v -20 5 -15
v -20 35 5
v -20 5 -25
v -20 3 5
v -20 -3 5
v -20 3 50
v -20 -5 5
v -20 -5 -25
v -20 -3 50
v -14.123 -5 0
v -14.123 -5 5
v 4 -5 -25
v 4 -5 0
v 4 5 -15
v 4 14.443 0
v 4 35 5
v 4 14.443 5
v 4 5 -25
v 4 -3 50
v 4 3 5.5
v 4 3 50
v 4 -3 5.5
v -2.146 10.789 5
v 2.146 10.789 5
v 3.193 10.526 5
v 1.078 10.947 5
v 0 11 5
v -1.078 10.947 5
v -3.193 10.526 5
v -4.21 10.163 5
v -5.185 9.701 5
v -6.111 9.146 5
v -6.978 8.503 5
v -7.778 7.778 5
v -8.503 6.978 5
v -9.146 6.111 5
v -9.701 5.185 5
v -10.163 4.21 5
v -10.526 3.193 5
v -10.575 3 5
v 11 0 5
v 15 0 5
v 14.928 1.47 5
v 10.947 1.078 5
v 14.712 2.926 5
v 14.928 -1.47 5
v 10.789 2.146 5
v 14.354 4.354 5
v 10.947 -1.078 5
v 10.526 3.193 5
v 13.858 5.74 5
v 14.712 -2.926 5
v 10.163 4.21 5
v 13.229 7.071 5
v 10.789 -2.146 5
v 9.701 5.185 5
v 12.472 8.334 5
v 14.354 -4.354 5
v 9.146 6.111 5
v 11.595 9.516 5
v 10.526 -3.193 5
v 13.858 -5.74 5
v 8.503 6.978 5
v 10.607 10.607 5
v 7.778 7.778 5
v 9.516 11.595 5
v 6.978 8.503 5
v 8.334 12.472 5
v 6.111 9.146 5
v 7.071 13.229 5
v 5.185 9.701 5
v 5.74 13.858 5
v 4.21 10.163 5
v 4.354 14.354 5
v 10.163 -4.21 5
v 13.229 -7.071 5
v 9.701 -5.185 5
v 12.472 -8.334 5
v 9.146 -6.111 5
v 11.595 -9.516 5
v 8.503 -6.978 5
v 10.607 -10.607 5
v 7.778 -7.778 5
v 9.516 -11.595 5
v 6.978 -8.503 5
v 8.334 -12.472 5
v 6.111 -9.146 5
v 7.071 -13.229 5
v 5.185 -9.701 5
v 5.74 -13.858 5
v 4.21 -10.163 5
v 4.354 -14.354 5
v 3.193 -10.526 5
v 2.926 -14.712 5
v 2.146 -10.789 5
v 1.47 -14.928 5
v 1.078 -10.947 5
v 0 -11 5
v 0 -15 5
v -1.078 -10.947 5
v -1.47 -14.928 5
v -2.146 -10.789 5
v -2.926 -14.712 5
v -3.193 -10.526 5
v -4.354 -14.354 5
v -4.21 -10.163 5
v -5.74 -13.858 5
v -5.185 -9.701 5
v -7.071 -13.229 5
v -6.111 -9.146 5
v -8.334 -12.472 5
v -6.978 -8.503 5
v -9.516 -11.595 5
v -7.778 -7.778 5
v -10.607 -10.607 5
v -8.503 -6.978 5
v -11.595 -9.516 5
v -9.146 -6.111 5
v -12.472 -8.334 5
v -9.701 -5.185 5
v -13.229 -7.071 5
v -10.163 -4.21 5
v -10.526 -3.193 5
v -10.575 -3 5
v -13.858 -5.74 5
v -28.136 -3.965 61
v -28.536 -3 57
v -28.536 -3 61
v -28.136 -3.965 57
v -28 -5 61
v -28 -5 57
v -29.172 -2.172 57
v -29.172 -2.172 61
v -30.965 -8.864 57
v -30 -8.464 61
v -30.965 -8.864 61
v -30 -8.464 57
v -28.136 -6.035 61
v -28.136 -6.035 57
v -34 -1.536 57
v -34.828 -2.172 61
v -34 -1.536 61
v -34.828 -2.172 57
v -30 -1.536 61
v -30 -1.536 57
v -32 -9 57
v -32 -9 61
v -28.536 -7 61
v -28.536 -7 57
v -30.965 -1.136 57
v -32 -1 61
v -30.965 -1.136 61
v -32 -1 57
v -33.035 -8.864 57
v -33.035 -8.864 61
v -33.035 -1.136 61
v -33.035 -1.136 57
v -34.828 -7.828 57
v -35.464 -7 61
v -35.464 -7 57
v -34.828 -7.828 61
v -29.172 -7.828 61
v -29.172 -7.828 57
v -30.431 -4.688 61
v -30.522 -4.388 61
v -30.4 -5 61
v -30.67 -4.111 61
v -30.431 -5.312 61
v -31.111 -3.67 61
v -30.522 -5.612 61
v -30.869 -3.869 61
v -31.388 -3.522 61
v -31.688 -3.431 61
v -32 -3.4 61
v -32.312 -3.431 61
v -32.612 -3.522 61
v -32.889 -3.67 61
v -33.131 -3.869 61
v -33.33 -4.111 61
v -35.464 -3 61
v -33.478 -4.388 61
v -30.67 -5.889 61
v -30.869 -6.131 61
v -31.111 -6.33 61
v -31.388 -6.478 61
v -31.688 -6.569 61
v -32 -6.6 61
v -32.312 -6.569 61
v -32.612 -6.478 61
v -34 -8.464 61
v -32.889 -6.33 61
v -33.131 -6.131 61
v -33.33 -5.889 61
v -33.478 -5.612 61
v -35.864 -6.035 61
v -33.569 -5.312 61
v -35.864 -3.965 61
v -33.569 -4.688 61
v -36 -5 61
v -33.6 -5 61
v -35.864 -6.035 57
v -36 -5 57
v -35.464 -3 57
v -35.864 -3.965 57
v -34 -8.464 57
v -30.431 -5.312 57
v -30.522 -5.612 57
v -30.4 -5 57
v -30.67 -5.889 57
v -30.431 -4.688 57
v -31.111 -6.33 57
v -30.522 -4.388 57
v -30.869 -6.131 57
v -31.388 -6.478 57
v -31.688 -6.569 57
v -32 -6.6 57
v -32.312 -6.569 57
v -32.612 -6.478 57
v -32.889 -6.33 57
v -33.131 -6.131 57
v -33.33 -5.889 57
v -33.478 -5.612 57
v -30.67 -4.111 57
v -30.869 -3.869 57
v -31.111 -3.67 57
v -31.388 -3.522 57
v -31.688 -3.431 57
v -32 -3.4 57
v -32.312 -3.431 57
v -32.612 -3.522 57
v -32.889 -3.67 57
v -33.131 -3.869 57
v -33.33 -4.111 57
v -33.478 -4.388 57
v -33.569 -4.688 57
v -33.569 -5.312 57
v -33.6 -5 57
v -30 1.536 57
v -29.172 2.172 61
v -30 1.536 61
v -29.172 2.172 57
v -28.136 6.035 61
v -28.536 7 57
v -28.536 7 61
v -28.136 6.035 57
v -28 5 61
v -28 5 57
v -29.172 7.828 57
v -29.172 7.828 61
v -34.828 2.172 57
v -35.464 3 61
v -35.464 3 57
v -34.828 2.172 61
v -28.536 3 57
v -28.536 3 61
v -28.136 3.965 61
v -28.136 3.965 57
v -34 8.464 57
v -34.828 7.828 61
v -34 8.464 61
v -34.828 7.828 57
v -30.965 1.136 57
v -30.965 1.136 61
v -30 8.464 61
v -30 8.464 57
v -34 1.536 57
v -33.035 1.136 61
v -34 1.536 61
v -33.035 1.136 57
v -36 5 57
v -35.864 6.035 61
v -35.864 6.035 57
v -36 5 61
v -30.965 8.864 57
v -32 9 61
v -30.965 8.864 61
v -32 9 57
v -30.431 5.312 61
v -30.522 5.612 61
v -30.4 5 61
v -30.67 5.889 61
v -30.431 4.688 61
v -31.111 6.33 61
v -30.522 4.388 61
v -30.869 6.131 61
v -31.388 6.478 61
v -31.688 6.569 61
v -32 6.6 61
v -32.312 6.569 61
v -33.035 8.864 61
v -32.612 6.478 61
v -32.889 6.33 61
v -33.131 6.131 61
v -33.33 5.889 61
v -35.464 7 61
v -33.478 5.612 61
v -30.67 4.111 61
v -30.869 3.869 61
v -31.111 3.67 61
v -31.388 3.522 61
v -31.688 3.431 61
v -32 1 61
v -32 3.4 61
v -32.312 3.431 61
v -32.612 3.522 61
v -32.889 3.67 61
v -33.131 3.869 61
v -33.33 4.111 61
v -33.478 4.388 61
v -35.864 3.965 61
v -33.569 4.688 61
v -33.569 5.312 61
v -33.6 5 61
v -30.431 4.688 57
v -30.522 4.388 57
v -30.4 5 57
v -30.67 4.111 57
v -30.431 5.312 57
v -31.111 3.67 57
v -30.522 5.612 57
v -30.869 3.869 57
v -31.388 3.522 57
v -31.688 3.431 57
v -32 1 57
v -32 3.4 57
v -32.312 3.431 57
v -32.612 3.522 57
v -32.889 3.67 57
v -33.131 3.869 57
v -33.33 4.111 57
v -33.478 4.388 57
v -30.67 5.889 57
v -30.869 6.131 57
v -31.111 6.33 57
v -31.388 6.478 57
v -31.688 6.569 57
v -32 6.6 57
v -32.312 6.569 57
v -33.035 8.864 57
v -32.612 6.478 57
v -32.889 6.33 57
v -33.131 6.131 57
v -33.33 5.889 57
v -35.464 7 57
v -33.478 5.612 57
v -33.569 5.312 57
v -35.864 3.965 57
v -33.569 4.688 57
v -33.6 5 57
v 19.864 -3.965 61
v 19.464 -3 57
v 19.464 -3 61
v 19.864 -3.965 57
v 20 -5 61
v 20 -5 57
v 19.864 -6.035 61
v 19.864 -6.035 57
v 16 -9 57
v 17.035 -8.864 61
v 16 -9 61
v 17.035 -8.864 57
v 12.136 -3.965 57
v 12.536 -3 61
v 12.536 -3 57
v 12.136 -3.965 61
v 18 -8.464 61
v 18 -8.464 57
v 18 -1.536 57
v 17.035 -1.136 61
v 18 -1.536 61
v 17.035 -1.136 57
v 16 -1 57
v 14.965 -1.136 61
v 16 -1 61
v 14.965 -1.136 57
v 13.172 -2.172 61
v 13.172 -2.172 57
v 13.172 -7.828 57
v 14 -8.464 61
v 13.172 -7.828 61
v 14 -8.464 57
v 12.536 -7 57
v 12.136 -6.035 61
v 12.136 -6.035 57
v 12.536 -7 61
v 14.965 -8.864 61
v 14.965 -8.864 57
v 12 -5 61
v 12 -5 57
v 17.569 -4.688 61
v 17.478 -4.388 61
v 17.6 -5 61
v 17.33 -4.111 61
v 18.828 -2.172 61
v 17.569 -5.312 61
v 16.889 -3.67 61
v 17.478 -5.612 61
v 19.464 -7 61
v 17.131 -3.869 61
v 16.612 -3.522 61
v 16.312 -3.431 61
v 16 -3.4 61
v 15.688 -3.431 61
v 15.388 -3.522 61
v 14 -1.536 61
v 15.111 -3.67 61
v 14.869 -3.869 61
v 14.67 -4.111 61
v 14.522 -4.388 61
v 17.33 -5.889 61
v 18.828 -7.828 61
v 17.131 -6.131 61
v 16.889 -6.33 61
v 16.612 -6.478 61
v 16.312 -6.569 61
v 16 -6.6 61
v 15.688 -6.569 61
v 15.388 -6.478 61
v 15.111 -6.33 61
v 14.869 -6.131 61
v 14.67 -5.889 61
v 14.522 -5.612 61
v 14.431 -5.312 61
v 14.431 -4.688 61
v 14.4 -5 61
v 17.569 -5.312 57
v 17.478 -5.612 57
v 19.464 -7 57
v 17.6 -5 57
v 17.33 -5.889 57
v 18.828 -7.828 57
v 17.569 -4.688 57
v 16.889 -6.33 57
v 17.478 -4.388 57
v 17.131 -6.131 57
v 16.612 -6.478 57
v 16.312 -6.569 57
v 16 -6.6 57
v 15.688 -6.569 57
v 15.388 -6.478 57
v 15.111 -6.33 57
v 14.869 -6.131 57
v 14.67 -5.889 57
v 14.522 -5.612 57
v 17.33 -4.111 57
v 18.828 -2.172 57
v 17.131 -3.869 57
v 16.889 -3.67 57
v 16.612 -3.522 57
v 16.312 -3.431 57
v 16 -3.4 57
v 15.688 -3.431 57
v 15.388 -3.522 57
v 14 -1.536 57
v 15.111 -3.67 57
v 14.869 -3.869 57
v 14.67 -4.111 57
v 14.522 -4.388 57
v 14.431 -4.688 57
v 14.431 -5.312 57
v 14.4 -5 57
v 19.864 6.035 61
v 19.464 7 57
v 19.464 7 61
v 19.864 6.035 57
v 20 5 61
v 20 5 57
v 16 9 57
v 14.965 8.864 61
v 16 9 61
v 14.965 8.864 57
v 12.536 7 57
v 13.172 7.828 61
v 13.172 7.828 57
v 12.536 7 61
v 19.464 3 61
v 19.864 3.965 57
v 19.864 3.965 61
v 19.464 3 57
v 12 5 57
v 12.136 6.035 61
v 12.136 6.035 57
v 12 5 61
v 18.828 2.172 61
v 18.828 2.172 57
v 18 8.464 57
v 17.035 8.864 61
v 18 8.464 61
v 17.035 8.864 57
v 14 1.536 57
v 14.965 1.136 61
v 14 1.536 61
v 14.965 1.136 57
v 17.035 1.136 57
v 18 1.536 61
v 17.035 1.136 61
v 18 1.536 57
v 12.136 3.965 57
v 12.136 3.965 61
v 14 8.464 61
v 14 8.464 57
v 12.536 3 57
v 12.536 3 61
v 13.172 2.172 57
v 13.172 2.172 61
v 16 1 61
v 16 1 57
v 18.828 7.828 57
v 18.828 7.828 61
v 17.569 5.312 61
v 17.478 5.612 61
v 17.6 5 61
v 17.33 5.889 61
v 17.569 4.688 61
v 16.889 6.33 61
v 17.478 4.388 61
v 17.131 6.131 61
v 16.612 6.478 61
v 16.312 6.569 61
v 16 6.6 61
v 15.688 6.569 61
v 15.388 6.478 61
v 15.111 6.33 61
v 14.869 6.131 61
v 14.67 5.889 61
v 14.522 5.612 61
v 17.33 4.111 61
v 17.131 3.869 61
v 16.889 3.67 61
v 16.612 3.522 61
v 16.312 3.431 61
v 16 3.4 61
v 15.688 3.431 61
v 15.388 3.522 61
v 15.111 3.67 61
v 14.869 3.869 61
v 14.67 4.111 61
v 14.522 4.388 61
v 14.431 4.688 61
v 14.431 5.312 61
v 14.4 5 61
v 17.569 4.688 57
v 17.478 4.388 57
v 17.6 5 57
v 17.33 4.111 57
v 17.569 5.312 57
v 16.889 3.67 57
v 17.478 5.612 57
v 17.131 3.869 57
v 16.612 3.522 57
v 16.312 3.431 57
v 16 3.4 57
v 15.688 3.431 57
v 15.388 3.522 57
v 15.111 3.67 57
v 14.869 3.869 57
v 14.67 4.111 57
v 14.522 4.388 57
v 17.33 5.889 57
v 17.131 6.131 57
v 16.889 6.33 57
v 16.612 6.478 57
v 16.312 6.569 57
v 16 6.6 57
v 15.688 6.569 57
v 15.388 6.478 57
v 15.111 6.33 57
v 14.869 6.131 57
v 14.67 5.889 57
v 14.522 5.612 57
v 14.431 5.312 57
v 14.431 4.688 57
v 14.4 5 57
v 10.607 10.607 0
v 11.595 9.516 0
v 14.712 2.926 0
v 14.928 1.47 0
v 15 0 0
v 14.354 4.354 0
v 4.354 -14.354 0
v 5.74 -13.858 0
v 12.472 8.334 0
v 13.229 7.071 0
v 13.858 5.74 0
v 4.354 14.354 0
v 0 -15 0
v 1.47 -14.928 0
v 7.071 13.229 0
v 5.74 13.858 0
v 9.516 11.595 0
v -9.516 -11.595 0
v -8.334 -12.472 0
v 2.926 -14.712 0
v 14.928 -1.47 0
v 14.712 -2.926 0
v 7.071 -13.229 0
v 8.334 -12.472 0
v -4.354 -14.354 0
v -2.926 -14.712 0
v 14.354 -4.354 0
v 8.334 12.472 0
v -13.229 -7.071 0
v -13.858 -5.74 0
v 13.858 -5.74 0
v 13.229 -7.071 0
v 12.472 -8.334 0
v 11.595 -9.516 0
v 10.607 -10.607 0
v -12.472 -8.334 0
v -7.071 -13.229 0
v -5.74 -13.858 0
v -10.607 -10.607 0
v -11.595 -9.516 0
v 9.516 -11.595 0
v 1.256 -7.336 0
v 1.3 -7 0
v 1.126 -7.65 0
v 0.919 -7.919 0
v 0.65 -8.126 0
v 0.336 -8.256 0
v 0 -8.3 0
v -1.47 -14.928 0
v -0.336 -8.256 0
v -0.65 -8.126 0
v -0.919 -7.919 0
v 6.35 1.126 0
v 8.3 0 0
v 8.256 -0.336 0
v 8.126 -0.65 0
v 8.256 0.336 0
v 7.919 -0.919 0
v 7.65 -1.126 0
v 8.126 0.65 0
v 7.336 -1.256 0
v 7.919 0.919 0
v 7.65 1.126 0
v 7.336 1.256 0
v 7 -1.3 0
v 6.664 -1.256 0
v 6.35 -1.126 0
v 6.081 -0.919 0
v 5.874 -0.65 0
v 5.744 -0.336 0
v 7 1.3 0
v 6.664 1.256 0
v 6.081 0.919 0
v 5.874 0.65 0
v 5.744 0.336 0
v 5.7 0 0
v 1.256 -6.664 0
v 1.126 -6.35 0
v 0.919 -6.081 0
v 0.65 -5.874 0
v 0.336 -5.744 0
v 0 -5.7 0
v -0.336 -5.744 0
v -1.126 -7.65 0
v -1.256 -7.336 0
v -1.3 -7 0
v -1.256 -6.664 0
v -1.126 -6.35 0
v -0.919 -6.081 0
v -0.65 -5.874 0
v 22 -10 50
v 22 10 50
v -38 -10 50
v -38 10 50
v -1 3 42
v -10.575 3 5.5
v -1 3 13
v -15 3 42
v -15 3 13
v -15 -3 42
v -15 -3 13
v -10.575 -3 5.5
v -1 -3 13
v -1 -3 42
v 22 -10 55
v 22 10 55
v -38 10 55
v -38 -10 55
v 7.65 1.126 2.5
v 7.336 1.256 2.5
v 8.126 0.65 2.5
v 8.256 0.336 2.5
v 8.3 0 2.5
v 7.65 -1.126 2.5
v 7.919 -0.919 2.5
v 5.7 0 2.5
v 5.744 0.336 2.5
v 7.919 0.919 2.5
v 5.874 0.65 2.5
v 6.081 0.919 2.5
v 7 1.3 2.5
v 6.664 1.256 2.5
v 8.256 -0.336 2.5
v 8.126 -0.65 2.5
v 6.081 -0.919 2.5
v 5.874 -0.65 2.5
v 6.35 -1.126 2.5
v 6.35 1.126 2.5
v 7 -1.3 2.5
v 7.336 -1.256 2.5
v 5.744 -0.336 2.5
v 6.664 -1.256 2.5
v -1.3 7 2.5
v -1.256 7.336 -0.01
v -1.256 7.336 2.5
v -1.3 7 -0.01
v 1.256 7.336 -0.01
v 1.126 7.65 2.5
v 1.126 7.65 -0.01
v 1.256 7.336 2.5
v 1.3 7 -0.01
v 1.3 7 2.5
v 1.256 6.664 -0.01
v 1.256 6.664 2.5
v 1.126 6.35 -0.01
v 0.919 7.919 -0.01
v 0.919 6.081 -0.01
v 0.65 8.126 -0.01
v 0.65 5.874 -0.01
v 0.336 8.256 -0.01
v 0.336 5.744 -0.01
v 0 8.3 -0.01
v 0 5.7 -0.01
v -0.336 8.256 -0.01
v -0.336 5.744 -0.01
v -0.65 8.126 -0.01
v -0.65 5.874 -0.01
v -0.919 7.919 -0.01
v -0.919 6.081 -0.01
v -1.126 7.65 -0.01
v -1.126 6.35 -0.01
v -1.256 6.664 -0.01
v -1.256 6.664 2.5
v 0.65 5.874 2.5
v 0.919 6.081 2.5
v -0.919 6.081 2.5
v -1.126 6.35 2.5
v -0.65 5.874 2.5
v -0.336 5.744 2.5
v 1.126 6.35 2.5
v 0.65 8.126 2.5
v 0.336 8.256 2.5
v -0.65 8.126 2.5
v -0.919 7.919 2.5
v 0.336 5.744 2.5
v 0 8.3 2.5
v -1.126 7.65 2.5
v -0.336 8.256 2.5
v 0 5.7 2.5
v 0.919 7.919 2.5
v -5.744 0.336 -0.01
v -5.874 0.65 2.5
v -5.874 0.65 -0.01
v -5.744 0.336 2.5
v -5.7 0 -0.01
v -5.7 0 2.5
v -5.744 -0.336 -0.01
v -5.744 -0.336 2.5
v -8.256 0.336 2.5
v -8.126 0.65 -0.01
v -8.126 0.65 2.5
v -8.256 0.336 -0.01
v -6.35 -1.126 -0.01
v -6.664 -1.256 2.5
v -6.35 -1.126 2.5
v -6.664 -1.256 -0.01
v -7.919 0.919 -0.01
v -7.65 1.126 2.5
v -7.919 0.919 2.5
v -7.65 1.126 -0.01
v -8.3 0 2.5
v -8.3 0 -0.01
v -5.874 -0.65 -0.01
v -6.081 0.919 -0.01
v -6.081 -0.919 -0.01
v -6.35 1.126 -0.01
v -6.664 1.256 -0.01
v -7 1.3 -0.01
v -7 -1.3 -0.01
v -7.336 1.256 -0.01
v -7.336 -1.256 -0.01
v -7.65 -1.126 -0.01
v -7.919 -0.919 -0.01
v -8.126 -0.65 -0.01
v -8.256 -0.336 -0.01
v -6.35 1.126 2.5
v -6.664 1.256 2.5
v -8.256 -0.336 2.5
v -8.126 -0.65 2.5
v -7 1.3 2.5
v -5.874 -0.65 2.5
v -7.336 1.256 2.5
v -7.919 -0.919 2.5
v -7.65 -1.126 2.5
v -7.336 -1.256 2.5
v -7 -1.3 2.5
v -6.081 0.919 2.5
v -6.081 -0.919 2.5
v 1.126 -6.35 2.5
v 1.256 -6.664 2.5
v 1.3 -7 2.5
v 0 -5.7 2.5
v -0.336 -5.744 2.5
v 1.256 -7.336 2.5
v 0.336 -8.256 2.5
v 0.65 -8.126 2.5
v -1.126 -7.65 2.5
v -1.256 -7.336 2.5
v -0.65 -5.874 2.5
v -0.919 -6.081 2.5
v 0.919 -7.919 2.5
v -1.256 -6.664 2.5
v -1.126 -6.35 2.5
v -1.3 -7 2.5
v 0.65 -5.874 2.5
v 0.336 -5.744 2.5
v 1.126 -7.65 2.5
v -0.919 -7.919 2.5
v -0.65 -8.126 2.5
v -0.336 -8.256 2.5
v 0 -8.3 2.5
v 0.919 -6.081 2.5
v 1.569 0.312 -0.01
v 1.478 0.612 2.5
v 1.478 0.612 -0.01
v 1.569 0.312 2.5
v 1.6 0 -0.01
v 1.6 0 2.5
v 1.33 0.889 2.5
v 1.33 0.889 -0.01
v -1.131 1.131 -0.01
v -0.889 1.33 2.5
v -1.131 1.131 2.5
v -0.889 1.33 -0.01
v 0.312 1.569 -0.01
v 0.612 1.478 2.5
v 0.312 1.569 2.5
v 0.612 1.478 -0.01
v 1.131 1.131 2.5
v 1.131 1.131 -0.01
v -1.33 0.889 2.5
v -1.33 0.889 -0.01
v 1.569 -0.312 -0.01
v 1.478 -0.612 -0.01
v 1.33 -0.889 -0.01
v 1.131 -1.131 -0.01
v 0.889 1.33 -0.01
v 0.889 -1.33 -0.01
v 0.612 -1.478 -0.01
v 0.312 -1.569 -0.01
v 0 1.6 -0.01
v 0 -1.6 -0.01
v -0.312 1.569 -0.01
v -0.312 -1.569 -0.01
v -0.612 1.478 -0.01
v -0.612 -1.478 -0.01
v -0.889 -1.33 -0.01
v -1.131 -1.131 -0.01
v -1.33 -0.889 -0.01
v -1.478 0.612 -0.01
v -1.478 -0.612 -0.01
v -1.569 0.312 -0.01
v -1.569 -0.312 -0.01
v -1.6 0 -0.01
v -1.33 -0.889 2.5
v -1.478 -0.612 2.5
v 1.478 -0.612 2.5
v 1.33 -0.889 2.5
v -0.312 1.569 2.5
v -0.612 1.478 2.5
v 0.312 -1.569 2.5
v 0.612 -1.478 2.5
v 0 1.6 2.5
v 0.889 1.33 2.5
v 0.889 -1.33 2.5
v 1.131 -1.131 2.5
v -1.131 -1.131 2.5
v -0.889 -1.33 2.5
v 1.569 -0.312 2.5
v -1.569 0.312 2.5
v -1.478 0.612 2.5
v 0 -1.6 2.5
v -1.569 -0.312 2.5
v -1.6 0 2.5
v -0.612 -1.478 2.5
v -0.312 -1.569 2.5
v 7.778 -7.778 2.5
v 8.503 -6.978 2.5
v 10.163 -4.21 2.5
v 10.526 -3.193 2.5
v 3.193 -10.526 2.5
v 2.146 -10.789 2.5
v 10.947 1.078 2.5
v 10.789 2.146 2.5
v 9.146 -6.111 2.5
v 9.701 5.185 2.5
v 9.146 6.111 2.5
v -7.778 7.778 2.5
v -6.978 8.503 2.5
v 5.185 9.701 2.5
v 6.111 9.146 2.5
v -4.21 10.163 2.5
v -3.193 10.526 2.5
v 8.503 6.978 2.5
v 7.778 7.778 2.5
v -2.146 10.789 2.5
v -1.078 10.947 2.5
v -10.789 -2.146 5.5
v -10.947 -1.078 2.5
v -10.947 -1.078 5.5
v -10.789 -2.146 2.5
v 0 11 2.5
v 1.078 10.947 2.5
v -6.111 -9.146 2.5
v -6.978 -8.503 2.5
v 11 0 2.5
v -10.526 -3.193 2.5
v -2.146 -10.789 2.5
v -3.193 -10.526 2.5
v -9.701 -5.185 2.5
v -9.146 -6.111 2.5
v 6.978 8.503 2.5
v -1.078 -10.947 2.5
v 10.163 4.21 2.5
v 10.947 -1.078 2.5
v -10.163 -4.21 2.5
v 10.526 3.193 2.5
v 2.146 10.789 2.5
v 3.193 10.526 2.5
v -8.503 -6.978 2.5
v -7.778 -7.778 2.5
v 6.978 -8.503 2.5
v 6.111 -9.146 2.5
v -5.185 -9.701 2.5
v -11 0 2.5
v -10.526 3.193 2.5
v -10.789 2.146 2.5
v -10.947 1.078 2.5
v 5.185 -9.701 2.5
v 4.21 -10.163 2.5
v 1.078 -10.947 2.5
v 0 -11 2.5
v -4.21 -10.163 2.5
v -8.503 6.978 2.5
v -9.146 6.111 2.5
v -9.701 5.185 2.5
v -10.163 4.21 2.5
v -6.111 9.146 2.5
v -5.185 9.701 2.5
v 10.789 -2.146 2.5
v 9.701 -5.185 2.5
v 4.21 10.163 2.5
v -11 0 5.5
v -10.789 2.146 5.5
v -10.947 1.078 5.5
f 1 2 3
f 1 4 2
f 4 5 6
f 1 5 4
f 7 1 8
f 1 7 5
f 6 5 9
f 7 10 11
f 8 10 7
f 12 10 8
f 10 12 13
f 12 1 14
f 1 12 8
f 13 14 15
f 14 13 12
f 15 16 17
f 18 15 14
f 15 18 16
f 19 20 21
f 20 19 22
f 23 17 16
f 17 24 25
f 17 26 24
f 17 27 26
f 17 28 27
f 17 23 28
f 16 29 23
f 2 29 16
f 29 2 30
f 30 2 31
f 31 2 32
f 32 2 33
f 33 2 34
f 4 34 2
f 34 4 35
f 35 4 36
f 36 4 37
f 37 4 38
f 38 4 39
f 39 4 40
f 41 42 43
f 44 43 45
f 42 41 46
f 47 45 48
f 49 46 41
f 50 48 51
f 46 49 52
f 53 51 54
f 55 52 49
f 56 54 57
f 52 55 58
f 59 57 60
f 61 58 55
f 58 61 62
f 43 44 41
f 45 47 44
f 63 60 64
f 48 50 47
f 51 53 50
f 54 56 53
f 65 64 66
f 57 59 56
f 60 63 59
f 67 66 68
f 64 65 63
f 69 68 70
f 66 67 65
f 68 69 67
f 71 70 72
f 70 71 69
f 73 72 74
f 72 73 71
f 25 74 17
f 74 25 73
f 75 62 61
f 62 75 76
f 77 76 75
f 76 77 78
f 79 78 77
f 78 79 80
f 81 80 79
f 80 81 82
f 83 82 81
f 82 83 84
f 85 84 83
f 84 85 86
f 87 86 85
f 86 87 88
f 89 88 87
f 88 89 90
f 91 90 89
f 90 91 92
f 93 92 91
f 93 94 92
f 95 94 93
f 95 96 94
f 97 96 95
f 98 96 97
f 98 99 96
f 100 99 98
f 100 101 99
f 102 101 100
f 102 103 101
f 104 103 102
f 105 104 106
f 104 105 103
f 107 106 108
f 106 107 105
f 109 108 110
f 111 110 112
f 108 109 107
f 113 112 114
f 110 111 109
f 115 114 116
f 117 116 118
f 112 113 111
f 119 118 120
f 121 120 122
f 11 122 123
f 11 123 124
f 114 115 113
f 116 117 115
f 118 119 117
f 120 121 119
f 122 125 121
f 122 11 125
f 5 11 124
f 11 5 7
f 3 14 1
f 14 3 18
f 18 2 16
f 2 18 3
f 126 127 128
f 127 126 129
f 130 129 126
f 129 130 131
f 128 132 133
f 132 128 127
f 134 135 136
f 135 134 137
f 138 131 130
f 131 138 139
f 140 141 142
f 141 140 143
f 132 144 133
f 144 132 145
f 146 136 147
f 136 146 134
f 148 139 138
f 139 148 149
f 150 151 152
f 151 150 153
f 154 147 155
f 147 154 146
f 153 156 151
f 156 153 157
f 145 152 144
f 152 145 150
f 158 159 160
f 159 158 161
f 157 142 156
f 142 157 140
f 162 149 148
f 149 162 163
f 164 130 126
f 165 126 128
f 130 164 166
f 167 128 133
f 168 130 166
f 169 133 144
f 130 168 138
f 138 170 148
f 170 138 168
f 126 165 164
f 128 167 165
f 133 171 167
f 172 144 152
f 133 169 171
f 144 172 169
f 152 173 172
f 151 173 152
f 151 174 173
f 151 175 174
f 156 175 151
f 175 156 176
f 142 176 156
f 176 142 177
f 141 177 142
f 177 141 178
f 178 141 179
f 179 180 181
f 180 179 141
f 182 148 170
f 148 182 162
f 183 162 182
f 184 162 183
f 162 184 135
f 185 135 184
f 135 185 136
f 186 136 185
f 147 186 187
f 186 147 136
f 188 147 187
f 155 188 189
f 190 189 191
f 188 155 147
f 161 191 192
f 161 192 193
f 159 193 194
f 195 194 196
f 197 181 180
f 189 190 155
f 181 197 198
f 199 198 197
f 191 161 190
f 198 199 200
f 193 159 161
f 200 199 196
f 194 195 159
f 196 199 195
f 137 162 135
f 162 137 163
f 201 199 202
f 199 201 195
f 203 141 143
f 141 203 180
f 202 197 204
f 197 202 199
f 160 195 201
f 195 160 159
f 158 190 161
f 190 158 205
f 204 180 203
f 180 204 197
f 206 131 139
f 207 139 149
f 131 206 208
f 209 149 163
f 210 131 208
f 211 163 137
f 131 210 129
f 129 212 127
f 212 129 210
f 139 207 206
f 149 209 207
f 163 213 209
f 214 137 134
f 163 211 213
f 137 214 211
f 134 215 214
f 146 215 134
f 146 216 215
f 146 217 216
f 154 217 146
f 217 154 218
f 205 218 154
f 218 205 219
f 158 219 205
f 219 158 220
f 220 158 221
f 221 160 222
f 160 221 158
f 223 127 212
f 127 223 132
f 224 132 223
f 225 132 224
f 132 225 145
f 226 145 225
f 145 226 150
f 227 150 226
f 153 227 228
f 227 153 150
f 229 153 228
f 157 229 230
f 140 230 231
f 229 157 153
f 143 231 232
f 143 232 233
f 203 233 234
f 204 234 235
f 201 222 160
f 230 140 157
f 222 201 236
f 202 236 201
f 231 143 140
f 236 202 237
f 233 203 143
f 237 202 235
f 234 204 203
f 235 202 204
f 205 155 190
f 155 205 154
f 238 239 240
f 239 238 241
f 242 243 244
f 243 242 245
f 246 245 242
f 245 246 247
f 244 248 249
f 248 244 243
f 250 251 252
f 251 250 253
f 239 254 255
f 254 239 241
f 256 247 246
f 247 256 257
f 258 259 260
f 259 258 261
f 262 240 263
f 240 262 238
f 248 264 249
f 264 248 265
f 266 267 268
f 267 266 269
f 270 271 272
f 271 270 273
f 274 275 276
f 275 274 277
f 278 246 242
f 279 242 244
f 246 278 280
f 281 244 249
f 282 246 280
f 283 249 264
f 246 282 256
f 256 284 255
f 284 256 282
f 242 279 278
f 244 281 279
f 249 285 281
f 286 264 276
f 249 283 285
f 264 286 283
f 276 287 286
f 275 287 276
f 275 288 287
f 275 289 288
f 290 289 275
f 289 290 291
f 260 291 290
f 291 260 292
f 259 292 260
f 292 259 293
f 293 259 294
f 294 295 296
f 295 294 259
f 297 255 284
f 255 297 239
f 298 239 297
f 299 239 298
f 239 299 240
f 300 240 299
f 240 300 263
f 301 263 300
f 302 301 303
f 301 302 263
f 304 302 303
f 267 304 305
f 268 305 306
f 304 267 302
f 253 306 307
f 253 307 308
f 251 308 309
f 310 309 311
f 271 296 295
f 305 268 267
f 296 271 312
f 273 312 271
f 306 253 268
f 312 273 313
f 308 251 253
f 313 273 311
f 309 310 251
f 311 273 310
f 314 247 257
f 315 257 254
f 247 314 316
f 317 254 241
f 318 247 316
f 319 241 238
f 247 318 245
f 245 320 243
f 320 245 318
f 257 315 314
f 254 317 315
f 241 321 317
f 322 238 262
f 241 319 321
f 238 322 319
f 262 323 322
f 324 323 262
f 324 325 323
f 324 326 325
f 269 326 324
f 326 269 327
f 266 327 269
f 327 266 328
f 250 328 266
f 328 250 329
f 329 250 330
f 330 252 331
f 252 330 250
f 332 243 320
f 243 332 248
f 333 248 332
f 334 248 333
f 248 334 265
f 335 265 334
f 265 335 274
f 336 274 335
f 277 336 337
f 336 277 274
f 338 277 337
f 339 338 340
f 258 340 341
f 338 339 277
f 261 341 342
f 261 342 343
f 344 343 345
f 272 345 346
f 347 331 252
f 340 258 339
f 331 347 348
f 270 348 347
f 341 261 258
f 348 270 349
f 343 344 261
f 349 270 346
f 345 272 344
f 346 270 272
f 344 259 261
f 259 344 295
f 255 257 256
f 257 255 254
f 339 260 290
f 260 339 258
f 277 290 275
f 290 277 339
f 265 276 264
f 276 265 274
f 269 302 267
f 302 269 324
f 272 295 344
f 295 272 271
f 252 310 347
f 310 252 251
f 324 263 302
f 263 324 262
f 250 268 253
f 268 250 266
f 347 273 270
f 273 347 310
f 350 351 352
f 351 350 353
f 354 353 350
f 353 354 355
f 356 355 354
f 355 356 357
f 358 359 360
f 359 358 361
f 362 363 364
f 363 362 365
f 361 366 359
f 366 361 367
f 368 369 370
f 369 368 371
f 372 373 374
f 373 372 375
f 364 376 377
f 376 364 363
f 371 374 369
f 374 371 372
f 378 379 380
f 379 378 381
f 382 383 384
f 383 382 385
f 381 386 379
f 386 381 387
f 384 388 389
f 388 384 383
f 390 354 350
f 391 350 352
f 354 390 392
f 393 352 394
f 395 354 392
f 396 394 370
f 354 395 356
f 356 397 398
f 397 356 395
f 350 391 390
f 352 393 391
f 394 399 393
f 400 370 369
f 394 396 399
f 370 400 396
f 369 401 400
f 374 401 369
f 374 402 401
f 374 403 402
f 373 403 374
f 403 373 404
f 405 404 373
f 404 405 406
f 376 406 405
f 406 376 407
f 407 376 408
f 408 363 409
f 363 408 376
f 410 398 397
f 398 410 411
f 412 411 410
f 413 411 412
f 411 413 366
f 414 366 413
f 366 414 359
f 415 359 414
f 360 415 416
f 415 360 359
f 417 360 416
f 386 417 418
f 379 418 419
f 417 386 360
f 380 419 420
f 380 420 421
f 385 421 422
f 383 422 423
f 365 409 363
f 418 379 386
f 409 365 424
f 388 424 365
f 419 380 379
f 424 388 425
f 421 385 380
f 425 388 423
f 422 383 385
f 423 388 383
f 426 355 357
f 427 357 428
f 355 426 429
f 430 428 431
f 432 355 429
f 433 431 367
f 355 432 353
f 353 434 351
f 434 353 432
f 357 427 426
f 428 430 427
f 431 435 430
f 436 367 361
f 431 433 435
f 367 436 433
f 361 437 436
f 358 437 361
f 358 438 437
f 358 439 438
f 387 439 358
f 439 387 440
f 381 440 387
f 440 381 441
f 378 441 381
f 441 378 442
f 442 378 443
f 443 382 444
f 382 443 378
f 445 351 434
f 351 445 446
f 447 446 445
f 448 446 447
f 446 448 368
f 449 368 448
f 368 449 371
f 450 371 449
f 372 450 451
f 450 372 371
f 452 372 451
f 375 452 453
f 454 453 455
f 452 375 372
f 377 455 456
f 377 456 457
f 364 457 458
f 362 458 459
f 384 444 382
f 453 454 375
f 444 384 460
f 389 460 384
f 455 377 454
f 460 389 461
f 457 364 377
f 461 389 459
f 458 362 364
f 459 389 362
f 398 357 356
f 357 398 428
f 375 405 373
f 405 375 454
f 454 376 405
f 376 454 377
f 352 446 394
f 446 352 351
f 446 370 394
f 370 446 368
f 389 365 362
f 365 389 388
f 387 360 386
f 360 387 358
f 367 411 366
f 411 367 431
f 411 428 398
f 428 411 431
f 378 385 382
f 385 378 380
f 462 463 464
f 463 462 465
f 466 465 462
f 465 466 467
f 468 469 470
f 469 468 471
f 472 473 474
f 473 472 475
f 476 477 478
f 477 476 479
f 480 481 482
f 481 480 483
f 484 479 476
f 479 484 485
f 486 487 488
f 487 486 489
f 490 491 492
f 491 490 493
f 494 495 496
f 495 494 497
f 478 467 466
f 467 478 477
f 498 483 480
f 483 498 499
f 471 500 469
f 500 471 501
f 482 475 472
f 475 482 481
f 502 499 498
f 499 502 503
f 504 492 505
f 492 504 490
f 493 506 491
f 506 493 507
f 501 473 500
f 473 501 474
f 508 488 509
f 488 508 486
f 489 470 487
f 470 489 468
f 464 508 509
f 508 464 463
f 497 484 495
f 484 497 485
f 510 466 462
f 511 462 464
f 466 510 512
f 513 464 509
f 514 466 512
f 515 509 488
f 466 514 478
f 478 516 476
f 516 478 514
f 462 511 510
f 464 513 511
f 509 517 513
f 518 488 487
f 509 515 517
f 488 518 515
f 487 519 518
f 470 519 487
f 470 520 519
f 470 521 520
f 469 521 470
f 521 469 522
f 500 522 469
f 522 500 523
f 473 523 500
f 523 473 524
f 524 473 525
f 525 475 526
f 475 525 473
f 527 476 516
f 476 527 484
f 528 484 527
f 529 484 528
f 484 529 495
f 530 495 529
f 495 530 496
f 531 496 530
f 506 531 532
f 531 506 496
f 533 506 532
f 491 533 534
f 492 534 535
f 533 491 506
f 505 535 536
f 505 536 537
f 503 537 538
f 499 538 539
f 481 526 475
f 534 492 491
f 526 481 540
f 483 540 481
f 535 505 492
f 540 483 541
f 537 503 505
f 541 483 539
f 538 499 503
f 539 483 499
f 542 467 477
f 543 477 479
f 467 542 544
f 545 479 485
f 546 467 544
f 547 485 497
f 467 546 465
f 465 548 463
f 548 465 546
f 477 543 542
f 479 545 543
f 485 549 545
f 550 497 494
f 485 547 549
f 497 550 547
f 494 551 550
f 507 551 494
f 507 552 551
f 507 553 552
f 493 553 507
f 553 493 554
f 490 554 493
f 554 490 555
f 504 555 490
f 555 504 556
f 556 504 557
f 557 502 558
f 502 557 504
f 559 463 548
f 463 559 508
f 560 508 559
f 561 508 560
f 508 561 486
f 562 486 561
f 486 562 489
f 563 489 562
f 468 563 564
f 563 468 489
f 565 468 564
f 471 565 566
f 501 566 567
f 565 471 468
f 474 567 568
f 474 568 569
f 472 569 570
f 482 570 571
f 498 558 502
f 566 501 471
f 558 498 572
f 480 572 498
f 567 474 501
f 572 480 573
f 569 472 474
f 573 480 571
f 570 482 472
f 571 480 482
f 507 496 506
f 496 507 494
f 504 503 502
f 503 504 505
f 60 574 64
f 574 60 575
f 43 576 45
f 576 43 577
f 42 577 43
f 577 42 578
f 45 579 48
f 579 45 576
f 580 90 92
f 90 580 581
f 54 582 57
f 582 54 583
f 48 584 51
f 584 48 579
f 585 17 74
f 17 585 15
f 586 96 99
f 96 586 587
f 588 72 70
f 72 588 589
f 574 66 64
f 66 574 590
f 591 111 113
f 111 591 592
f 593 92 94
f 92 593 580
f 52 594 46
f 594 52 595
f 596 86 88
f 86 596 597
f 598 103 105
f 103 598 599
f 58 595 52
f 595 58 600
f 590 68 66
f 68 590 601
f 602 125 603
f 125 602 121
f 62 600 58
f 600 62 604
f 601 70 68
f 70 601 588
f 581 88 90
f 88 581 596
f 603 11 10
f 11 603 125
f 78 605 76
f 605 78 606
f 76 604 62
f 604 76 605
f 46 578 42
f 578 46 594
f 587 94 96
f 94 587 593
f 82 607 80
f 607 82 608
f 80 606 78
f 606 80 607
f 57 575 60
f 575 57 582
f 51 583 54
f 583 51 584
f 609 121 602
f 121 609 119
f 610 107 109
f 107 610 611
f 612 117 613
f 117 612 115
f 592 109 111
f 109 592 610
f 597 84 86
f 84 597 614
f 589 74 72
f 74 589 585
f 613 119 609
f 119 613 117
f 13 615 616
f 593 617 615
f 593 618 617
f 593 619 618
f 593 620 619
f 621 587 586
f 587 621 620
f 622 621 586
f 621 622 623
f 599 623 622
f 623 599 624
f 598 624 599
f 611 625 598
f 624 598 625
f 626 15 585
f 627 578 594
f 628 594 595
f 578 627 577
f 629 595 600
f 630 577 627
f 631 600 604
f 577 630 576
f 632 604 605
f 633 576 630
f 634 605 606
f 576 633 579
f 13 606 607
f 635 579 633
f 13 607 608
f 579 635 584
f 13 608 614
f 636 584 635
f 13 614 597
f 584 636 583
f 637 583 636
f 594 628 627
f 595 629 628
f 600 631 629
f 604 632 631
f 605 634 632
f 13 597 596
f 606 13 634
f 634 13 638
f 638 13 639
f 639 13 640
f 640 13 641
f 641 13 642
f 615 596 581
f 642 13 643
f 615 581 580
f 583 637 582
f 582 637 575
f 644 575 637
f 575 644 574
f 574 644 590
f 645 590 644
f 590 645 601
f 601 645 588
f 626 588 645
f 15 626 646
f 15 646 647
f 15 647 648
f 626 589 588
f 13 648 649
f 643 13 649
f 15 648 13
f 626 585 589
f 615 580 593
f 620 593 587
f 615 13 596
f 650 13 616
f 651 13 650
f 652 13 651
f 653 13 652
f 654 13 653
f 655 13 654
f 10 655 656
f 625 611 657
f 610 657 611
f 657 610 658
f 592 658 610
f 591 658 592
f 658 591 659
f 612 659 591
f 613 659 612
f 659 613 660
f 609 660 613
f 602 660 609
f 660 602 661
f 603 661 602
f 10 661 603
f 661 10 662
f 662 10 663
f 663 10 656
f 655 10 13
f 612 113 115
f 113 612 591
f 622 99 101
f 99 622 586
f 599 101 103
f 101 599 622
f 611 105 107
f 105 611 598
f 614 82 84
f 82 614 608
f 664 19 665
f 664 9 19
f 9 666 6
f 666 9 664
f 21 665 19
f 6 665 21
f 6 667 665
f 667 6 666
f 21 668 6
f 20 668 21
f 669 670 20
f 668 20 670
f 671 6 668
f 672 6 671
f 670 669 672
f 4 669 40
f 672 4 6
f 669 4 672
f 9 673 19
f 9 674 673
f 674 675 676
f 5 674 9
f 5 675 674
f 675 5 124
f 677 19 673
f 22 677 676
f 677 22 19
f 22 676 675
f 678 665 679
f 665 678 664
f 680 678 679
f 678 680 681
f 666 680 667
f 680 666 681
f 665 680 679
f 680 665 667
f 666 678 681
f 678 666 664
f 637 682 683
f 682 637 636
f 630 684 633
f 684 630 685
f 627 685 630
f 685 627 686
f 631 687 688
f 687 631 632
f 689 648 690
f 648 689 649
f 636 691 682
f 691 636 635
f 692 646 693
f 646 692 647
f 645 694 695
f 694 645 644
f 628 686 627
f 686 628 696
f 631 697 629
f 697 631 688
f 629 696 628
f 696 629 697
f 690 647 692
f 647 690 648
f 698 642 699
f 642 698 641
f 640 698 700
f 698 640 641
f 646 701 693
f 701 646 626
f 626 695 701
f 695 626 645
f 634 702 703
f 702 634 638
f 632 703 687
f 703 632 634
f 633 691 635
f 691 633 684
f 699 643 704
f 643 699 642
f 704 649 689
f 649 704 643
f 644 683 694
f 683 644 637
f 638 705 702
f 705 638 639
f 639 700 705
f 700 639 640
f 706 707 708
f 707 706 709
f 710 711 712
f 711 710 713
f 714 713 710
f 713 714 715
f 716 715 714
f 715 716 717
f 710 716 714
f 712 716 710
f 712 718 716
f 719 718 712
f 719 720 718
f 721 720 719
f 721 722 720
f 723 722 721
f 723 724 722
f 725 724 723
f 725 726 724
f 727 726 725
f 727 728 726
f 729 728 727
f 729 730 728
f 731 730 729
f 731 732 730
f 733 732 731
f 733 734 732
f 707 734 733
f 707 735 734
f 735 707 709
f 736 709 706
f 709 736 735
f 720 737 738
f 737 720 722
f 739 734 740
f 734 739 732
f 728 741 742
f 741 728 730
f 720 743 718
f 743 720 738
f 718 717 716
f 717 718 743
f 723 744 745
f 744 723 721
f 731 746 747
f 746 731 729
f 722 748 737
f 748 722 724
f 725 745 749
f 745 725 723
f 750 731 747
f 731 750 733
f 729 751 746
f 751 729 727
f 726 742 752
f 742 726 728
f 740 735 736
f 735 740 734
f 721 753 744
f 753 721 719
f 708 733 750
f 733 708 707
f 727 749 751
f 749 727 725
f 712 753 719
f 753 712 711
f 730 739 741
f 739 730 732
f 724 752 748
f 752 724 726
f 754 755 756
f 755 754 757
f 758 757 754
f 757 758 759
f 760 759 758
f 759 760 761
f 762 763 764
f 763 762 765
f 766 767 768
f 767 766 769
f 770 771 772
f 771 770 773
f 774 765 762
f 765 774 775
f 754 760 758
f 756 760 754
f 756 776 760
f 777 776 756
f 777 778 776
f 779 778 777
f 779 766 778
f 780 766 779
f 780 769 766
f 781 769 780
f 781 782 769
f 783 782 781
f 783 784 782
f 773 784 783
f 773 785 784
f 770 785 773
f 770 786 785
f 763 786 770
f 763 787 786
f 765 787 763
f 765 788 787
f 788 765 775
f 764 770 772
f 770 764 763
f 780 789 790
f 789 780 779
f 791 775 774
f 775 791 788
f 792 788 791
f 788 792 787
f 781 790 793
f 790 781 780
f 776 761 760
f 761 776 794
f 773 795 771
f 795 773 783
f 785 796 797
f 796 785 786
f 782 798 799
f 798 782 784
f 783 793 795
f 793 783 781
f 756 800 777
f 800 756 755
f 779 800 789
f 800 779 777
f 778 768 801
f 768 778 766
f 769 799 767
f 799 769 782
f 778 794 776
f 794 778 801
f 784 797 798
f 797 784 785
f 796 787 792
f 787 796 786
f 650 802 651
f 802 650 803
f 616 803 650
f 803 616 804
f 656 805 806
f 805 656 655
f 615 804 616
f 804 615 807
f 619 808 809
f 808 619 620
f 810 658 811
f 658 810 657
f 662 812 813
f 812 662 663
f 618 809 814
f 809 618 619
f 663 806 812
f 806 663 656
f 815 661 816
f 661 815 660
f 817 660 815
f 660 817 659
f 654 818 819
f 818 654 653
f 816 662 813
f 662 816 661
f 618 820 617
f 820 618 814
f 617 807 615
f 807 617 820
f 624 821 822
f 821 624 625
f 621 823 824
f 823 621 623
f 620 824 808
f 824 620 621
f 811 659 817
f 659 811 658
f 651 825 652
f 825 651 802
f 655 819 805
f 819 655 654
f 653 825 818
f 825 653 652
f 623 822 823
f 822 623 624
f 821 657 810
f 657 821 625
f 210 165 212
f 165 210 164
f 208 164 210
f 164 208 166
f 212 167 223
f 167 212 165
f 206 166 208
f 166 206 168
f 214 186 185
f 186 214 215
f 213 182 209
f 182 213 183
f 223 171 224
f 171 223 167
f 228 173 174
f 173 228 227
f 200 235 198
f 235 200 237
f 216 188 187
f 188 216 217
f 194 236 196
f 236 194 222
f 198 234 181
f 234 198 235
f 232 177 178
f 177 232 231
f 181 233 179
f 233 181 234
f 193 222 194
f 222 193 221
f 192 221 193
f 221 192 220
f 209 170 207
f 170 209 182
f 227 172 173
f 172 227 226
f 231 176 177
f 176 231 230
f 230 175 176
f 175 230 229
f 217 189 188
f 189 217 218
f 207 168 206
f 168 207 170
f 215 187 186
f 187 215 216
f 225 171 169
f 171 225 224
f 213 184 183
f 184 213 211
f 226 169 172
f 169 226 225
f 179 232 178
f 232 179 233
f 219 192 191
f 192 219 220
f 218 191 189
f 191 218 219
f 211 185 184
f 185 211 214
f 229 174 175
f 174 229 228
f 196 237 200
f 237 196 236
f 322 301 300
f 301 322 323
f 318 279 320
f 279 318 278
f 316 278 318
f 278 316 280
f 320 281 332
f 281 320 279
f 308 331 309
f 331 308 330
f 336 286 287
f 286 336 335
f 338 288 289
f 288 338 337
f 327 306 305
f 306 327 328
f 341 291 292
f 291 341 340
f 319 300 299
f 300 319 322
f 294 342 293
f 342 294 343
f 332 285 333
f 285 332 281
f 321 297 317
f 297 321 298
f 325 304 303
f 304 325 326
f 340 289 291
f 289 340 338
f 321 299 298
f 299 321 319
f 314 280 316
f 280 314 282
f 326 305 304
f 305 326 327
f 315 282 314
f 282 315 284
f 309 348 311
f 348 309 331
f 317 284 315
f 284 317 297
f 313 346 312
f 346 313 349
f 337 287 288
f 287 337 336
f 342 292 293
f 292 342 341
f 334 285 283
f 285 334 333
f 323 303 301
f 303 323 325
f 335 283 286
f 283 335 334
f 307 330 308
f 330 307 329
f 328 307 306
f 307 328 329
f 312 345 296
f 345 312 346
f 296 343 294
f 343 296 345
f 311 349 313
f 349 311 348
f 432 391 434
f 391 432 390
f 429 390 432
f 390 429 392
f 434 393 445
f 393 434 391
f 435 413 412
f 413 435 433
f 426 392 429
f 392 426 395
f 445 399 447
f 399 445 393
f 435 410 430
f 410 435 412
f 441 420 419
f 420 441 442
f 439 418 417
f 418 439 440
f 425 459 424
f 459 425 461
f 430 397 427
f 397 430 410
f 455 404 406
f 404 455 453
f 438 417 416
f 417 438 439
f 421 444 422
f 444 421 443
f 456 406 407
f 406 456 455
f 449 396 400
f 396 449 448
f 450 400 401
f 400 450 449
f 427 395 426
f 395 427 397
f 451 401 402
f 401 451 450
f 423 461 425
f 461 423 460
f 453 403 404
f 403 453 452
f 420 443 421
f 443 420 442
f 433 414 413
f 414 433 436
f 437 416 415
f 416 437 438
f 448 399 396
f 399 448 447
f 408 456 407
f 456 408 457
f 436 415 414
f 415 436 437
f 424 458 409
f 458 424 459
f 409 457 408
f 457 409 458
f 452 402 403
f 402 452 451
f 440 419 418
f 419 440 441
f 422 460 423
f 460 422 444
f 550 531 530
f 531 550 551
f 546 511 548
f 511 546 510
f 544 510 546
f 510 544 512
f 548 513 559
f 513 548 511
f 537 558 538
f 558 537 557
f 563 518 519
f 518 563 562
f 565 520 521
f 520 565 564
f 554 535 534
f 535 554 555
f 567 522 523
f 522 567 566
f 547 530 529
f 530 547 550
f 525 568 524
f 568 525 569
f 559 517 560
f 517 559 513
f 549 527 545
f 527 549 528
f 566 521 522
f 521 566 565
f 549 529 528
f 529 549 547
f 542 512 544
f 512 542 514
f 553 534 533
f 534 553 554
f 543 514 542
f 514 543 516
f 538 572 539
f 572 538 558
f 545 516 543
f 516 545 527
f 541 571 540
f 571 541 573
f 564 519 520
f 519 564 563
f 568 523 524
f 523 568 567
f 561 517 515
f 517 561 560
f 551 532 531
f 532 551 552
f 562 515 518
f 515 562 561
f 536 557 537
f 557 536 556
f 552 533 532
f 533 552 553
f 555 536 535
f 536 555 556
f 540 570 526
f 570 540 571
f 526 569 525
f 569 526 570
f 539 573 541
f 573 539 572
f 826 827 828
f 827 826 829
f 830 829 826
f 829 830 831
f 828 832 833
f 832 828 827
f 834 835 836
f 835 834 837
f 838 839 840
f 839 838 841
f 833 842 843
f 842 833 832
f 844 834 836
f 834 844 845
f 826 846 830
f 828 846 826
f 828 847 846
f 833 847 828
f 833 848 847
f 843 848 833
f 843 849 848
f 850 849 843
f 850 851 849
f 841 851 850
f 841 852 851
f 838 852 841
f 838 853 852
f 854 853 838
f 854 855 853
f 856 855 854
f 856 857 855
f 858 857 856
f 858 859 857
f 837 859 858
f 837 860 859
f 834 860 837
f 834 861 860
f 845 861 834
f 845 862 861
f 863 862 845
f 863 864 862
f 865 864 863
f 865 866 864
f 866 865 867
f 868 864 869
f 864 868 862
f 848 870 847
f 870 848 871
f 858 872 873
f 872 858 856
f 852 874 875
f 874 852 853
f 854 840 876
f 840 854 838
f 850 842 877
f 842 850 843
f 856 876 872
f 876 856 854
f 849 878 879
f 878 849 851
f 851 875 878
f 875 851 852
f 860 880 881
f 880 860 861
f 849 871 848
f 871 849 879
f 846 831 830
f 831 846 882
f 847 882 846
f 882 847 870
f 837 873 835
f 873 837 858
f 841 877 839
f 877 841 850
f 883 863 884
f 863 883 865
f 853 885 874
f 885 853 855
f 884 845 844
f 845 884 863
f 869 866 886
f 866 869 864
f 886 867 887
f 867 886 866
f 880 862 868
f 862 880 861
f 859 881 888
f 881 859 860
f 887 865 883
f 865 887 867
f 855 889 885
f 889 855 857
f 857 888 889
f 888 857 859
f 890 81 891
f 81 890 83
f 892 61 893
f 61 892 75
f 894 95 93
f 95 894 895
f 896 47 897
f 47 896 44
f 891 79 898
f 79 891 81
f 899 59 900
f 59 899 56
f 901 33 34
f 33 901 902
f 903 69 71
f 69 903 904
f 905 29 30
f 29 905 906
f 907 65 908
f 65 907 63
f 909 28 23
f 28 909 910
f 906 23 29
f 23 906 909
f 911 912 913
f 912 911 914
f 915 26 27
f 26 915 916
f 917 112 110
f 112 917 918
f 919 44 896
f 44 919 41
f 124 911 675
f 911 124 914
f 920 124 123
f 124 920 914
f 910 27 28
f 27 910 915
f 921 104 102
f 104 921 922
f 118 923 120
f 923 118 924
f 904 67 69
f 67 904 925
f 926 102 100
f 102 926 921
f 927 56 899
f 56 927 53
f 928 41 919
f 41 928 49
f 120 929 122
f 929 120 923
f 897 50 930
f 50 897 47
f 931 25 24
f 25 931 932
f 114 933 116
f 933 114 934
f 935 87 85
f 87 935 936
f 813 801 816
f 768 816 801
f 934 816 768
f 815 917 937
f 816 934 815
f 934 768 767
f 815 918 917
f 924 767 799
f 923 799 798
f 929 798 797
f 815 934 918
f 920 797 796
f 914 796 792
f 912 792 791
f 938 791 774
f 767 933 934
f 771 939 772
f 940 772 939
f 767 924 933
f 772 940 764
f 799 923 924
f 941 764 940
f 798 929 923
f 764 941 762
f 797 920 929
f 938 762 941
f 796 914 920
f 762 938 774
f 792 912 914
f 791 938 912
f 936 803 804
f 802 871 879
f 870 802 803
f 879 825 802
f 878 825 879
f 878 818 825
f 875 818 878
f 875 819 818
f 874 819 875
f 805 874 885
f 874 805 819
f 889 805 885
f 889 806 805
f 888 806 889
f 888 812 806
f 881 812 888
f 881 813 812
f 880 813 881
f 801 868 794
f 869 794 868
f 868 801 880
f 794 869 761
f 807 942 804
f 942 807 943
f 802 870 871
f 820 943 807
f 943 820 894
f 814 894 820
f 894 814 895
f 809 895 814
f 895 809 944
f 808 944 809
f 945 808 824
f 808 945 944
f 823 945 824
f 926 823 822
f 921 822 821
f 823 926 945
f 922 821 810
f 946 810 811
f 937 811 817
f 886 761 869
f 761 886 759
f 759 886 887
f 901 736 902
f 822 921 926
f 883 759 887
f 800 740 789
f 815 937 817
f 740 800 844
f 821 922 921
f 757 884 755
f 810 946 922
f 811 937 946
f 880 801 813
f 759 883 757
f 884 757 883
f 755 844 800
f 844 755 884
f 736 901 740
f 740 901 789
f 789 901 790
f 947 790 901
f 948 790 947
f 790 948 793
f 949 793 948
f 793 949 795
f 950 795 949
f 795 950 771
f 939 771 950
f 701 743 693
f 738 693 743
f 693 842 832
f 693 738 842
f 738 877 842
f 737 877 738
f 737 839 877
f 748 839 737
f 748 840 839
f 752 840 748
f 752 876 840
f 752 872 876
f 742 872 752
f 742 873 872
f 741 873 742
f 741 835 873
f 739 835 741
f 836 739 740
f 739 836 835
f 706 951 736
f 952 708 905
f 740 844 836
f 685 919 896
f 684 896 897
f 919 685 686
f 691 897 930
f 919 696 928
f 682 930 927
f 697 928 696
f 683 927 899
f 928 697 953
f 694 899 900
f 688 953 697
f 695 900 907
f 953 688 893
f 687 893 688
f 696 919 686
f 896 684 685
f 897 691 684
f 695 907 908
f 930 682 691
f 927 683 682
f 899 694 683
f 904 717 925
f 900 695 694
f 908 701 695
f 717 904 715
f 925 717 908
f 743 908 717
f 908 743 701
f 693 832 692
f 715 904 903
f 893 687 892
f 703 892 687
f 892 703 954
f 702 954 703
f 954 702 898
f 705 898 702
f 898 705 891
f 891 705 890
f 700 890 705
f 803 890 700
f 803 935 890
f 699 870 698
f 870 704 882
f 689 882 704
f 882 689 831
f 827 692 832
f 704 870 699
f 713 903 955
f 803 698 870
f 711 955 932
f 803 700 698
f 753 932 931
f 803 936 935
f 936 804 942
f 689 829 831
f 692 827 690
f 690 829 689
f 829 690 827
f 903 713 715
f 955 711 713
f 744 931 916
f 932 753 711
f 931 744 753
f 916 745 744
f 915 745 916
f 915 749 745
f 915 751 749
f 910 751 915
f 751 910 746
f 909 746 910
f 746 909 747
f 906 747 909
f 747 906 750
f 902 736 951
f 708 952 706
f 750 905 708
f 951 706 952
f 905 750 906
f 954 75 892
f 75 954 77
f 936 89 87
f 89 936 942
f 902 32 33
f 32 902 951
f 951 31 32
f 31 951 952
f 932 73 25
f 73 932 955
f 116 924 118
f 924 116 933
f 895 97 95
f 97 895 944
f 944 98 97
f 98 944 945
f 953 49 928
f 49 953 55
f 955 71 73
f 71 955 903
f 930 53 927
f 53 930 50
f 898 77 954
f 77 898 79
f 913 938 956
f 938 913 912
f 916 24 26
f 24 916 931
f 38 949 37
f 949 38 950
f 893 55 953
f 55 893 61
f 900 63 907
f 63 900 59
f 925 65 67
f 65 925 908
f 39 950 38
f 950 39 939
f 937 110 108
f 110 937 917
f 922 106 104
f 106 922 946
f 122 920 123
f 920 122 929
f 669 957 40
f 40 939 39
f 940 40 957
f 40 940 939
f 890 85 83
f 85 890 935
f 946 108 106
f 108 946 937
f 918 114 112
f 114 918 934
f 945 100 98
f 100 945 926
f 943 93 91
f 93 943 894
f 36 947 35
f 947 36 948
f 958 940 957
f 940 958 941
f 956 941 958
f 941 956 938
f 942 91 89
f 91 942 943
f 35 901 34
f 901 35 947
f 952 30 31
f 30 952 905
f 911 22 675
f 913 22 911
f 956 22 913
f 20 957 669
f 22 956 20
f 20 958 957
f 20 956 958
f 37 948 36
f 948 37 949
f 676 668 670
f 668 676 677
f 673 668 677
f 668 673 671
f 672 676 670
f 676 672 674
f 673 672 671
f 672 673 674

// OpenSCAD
// ============================================================
// 03_云台_Pitch轴.scad — Pitch俯仰支架 v3
// ============================================================
// 连接Pitch舵机(MG996R) → Roll舵机
// - 底板用4×M2.5固定在舵机自带圆形舵盘上 (14mm圆)
// - 顶部4×M3固定Roll舵机的安装耳 (48×10mm)
// - 简化几何，减少支撑需求
// ============================================================

/* [全局参数] */
// 舵盘接口
horn_circle   = 14;    // 舵盘螺丝圆直径
horn_hole     = 2.6;   // M2.5通孔
center_hole   = 3.2;   // M3舵盘中心螺丝

// 支架几何
base_dia      = 30;    // 底圆盘直径
base_thick    = 5;
arm_offset_x  = -8;    // 臂相对舵盘中心的X偏移 (负=向后, 使平台重心后移)
arm_height    = 45;    // 臂高
arm_width     = 24;    // 臂宽
arm_thick     = 6;     // 臂厚

// Roll舵机座 (MG996R标准安装耳 48×10mm)
servo_mount_l = 48;    // 长孔距
servo_mount_w = 10;    // 宽孔距
servo_hole    = 3.2;   // M3

// ============================================================
module pitch_bracket() {
    difference() {
        union() {
            // 底圆盘
            cylinder(d = base_dia, h = base_thick, $fn = 64);

            // 竖直臂
            translate([arm_offset_x, 0, base_thick + arm_height/2])
            cube([arm_width, arm_thick, arm_height], center = true);

            // 臂根三角加强
            for (s = [-1, 1])
                translate([arm_offset_x, s * (arm_thick/2 + 2), base_thick])
                rotate([0, 90, 0])
                linear_extrude(height = arm_width, center = true)
                polygon([[0,0], [30,0], [0,30]]);

            // 顶部舵机座板
            translate([arm_offset_x, 0, base_thick + arm_height + 2.5])
            cube([servo_mount_l + 12, arm_thick + 14, 5], center = true);

            // 安装耳垫高
            for (x = [-servo_mount_l/2, servo_mount_l/2])
                for (y = [-servo_mount_w/2, servo_mount_w/2])
                    translate([arm_offset_x + x, y, base_thick + arm_height + 5 + 2])
                    cylinder(d = 8, h = 4, $fn = 24);
        }

        // 舵盘中心孔
        translate([0, 0, -0.01])
        cylinder(d = center_hole, h = base_thick + 0.02, $fn = 32);

        // 舵盘4×M2.5
        for (a = [0:90:270])
            translate([horn_circle/2 * cos(a), horn_circle/2 * sin(a), -0.01])
            cylinder(d = horn_hole, h = base_thick + 0.02, $fn = 24);

        // 舵盘嵌入槽
        translate([0, 0, base_thick - 2.5])
        cylinder(d = 22, h = 3, $fn = 64);

        // Roll舵机安装孔
        for (x = [-servo_mount_l/2, servo_mount_l/2])
            for (y = [-servo_mount_w/2, servo_mount_w/2])
                translate([arm_offset_x + x, y, base_thick + arm_height + 5 + 2 - 0.01])
                cylinder(d = servo_hole, h = 20, $fn = 32);

        // 减重孔
        translate([arm_offset_x, 0, base_thick + arm_height/2])
        cube([arm_width - 10, arm_thick + 2, arm_height - 16], center = true);
    }
}

pitch_bracket();

// ============================================================
// 装配：舵盘→M3中心螺丝锁在舵机轴上→此件用4×M2.5锁在舵盘上
//       Roll舵机→用随舵机附带的橡胶垫+铜套+4×M3锁在顶部
// 打印：填充35%+, 底圆盘朝下, 臂朝上, 需支撑, ~1h
// ============================================================
